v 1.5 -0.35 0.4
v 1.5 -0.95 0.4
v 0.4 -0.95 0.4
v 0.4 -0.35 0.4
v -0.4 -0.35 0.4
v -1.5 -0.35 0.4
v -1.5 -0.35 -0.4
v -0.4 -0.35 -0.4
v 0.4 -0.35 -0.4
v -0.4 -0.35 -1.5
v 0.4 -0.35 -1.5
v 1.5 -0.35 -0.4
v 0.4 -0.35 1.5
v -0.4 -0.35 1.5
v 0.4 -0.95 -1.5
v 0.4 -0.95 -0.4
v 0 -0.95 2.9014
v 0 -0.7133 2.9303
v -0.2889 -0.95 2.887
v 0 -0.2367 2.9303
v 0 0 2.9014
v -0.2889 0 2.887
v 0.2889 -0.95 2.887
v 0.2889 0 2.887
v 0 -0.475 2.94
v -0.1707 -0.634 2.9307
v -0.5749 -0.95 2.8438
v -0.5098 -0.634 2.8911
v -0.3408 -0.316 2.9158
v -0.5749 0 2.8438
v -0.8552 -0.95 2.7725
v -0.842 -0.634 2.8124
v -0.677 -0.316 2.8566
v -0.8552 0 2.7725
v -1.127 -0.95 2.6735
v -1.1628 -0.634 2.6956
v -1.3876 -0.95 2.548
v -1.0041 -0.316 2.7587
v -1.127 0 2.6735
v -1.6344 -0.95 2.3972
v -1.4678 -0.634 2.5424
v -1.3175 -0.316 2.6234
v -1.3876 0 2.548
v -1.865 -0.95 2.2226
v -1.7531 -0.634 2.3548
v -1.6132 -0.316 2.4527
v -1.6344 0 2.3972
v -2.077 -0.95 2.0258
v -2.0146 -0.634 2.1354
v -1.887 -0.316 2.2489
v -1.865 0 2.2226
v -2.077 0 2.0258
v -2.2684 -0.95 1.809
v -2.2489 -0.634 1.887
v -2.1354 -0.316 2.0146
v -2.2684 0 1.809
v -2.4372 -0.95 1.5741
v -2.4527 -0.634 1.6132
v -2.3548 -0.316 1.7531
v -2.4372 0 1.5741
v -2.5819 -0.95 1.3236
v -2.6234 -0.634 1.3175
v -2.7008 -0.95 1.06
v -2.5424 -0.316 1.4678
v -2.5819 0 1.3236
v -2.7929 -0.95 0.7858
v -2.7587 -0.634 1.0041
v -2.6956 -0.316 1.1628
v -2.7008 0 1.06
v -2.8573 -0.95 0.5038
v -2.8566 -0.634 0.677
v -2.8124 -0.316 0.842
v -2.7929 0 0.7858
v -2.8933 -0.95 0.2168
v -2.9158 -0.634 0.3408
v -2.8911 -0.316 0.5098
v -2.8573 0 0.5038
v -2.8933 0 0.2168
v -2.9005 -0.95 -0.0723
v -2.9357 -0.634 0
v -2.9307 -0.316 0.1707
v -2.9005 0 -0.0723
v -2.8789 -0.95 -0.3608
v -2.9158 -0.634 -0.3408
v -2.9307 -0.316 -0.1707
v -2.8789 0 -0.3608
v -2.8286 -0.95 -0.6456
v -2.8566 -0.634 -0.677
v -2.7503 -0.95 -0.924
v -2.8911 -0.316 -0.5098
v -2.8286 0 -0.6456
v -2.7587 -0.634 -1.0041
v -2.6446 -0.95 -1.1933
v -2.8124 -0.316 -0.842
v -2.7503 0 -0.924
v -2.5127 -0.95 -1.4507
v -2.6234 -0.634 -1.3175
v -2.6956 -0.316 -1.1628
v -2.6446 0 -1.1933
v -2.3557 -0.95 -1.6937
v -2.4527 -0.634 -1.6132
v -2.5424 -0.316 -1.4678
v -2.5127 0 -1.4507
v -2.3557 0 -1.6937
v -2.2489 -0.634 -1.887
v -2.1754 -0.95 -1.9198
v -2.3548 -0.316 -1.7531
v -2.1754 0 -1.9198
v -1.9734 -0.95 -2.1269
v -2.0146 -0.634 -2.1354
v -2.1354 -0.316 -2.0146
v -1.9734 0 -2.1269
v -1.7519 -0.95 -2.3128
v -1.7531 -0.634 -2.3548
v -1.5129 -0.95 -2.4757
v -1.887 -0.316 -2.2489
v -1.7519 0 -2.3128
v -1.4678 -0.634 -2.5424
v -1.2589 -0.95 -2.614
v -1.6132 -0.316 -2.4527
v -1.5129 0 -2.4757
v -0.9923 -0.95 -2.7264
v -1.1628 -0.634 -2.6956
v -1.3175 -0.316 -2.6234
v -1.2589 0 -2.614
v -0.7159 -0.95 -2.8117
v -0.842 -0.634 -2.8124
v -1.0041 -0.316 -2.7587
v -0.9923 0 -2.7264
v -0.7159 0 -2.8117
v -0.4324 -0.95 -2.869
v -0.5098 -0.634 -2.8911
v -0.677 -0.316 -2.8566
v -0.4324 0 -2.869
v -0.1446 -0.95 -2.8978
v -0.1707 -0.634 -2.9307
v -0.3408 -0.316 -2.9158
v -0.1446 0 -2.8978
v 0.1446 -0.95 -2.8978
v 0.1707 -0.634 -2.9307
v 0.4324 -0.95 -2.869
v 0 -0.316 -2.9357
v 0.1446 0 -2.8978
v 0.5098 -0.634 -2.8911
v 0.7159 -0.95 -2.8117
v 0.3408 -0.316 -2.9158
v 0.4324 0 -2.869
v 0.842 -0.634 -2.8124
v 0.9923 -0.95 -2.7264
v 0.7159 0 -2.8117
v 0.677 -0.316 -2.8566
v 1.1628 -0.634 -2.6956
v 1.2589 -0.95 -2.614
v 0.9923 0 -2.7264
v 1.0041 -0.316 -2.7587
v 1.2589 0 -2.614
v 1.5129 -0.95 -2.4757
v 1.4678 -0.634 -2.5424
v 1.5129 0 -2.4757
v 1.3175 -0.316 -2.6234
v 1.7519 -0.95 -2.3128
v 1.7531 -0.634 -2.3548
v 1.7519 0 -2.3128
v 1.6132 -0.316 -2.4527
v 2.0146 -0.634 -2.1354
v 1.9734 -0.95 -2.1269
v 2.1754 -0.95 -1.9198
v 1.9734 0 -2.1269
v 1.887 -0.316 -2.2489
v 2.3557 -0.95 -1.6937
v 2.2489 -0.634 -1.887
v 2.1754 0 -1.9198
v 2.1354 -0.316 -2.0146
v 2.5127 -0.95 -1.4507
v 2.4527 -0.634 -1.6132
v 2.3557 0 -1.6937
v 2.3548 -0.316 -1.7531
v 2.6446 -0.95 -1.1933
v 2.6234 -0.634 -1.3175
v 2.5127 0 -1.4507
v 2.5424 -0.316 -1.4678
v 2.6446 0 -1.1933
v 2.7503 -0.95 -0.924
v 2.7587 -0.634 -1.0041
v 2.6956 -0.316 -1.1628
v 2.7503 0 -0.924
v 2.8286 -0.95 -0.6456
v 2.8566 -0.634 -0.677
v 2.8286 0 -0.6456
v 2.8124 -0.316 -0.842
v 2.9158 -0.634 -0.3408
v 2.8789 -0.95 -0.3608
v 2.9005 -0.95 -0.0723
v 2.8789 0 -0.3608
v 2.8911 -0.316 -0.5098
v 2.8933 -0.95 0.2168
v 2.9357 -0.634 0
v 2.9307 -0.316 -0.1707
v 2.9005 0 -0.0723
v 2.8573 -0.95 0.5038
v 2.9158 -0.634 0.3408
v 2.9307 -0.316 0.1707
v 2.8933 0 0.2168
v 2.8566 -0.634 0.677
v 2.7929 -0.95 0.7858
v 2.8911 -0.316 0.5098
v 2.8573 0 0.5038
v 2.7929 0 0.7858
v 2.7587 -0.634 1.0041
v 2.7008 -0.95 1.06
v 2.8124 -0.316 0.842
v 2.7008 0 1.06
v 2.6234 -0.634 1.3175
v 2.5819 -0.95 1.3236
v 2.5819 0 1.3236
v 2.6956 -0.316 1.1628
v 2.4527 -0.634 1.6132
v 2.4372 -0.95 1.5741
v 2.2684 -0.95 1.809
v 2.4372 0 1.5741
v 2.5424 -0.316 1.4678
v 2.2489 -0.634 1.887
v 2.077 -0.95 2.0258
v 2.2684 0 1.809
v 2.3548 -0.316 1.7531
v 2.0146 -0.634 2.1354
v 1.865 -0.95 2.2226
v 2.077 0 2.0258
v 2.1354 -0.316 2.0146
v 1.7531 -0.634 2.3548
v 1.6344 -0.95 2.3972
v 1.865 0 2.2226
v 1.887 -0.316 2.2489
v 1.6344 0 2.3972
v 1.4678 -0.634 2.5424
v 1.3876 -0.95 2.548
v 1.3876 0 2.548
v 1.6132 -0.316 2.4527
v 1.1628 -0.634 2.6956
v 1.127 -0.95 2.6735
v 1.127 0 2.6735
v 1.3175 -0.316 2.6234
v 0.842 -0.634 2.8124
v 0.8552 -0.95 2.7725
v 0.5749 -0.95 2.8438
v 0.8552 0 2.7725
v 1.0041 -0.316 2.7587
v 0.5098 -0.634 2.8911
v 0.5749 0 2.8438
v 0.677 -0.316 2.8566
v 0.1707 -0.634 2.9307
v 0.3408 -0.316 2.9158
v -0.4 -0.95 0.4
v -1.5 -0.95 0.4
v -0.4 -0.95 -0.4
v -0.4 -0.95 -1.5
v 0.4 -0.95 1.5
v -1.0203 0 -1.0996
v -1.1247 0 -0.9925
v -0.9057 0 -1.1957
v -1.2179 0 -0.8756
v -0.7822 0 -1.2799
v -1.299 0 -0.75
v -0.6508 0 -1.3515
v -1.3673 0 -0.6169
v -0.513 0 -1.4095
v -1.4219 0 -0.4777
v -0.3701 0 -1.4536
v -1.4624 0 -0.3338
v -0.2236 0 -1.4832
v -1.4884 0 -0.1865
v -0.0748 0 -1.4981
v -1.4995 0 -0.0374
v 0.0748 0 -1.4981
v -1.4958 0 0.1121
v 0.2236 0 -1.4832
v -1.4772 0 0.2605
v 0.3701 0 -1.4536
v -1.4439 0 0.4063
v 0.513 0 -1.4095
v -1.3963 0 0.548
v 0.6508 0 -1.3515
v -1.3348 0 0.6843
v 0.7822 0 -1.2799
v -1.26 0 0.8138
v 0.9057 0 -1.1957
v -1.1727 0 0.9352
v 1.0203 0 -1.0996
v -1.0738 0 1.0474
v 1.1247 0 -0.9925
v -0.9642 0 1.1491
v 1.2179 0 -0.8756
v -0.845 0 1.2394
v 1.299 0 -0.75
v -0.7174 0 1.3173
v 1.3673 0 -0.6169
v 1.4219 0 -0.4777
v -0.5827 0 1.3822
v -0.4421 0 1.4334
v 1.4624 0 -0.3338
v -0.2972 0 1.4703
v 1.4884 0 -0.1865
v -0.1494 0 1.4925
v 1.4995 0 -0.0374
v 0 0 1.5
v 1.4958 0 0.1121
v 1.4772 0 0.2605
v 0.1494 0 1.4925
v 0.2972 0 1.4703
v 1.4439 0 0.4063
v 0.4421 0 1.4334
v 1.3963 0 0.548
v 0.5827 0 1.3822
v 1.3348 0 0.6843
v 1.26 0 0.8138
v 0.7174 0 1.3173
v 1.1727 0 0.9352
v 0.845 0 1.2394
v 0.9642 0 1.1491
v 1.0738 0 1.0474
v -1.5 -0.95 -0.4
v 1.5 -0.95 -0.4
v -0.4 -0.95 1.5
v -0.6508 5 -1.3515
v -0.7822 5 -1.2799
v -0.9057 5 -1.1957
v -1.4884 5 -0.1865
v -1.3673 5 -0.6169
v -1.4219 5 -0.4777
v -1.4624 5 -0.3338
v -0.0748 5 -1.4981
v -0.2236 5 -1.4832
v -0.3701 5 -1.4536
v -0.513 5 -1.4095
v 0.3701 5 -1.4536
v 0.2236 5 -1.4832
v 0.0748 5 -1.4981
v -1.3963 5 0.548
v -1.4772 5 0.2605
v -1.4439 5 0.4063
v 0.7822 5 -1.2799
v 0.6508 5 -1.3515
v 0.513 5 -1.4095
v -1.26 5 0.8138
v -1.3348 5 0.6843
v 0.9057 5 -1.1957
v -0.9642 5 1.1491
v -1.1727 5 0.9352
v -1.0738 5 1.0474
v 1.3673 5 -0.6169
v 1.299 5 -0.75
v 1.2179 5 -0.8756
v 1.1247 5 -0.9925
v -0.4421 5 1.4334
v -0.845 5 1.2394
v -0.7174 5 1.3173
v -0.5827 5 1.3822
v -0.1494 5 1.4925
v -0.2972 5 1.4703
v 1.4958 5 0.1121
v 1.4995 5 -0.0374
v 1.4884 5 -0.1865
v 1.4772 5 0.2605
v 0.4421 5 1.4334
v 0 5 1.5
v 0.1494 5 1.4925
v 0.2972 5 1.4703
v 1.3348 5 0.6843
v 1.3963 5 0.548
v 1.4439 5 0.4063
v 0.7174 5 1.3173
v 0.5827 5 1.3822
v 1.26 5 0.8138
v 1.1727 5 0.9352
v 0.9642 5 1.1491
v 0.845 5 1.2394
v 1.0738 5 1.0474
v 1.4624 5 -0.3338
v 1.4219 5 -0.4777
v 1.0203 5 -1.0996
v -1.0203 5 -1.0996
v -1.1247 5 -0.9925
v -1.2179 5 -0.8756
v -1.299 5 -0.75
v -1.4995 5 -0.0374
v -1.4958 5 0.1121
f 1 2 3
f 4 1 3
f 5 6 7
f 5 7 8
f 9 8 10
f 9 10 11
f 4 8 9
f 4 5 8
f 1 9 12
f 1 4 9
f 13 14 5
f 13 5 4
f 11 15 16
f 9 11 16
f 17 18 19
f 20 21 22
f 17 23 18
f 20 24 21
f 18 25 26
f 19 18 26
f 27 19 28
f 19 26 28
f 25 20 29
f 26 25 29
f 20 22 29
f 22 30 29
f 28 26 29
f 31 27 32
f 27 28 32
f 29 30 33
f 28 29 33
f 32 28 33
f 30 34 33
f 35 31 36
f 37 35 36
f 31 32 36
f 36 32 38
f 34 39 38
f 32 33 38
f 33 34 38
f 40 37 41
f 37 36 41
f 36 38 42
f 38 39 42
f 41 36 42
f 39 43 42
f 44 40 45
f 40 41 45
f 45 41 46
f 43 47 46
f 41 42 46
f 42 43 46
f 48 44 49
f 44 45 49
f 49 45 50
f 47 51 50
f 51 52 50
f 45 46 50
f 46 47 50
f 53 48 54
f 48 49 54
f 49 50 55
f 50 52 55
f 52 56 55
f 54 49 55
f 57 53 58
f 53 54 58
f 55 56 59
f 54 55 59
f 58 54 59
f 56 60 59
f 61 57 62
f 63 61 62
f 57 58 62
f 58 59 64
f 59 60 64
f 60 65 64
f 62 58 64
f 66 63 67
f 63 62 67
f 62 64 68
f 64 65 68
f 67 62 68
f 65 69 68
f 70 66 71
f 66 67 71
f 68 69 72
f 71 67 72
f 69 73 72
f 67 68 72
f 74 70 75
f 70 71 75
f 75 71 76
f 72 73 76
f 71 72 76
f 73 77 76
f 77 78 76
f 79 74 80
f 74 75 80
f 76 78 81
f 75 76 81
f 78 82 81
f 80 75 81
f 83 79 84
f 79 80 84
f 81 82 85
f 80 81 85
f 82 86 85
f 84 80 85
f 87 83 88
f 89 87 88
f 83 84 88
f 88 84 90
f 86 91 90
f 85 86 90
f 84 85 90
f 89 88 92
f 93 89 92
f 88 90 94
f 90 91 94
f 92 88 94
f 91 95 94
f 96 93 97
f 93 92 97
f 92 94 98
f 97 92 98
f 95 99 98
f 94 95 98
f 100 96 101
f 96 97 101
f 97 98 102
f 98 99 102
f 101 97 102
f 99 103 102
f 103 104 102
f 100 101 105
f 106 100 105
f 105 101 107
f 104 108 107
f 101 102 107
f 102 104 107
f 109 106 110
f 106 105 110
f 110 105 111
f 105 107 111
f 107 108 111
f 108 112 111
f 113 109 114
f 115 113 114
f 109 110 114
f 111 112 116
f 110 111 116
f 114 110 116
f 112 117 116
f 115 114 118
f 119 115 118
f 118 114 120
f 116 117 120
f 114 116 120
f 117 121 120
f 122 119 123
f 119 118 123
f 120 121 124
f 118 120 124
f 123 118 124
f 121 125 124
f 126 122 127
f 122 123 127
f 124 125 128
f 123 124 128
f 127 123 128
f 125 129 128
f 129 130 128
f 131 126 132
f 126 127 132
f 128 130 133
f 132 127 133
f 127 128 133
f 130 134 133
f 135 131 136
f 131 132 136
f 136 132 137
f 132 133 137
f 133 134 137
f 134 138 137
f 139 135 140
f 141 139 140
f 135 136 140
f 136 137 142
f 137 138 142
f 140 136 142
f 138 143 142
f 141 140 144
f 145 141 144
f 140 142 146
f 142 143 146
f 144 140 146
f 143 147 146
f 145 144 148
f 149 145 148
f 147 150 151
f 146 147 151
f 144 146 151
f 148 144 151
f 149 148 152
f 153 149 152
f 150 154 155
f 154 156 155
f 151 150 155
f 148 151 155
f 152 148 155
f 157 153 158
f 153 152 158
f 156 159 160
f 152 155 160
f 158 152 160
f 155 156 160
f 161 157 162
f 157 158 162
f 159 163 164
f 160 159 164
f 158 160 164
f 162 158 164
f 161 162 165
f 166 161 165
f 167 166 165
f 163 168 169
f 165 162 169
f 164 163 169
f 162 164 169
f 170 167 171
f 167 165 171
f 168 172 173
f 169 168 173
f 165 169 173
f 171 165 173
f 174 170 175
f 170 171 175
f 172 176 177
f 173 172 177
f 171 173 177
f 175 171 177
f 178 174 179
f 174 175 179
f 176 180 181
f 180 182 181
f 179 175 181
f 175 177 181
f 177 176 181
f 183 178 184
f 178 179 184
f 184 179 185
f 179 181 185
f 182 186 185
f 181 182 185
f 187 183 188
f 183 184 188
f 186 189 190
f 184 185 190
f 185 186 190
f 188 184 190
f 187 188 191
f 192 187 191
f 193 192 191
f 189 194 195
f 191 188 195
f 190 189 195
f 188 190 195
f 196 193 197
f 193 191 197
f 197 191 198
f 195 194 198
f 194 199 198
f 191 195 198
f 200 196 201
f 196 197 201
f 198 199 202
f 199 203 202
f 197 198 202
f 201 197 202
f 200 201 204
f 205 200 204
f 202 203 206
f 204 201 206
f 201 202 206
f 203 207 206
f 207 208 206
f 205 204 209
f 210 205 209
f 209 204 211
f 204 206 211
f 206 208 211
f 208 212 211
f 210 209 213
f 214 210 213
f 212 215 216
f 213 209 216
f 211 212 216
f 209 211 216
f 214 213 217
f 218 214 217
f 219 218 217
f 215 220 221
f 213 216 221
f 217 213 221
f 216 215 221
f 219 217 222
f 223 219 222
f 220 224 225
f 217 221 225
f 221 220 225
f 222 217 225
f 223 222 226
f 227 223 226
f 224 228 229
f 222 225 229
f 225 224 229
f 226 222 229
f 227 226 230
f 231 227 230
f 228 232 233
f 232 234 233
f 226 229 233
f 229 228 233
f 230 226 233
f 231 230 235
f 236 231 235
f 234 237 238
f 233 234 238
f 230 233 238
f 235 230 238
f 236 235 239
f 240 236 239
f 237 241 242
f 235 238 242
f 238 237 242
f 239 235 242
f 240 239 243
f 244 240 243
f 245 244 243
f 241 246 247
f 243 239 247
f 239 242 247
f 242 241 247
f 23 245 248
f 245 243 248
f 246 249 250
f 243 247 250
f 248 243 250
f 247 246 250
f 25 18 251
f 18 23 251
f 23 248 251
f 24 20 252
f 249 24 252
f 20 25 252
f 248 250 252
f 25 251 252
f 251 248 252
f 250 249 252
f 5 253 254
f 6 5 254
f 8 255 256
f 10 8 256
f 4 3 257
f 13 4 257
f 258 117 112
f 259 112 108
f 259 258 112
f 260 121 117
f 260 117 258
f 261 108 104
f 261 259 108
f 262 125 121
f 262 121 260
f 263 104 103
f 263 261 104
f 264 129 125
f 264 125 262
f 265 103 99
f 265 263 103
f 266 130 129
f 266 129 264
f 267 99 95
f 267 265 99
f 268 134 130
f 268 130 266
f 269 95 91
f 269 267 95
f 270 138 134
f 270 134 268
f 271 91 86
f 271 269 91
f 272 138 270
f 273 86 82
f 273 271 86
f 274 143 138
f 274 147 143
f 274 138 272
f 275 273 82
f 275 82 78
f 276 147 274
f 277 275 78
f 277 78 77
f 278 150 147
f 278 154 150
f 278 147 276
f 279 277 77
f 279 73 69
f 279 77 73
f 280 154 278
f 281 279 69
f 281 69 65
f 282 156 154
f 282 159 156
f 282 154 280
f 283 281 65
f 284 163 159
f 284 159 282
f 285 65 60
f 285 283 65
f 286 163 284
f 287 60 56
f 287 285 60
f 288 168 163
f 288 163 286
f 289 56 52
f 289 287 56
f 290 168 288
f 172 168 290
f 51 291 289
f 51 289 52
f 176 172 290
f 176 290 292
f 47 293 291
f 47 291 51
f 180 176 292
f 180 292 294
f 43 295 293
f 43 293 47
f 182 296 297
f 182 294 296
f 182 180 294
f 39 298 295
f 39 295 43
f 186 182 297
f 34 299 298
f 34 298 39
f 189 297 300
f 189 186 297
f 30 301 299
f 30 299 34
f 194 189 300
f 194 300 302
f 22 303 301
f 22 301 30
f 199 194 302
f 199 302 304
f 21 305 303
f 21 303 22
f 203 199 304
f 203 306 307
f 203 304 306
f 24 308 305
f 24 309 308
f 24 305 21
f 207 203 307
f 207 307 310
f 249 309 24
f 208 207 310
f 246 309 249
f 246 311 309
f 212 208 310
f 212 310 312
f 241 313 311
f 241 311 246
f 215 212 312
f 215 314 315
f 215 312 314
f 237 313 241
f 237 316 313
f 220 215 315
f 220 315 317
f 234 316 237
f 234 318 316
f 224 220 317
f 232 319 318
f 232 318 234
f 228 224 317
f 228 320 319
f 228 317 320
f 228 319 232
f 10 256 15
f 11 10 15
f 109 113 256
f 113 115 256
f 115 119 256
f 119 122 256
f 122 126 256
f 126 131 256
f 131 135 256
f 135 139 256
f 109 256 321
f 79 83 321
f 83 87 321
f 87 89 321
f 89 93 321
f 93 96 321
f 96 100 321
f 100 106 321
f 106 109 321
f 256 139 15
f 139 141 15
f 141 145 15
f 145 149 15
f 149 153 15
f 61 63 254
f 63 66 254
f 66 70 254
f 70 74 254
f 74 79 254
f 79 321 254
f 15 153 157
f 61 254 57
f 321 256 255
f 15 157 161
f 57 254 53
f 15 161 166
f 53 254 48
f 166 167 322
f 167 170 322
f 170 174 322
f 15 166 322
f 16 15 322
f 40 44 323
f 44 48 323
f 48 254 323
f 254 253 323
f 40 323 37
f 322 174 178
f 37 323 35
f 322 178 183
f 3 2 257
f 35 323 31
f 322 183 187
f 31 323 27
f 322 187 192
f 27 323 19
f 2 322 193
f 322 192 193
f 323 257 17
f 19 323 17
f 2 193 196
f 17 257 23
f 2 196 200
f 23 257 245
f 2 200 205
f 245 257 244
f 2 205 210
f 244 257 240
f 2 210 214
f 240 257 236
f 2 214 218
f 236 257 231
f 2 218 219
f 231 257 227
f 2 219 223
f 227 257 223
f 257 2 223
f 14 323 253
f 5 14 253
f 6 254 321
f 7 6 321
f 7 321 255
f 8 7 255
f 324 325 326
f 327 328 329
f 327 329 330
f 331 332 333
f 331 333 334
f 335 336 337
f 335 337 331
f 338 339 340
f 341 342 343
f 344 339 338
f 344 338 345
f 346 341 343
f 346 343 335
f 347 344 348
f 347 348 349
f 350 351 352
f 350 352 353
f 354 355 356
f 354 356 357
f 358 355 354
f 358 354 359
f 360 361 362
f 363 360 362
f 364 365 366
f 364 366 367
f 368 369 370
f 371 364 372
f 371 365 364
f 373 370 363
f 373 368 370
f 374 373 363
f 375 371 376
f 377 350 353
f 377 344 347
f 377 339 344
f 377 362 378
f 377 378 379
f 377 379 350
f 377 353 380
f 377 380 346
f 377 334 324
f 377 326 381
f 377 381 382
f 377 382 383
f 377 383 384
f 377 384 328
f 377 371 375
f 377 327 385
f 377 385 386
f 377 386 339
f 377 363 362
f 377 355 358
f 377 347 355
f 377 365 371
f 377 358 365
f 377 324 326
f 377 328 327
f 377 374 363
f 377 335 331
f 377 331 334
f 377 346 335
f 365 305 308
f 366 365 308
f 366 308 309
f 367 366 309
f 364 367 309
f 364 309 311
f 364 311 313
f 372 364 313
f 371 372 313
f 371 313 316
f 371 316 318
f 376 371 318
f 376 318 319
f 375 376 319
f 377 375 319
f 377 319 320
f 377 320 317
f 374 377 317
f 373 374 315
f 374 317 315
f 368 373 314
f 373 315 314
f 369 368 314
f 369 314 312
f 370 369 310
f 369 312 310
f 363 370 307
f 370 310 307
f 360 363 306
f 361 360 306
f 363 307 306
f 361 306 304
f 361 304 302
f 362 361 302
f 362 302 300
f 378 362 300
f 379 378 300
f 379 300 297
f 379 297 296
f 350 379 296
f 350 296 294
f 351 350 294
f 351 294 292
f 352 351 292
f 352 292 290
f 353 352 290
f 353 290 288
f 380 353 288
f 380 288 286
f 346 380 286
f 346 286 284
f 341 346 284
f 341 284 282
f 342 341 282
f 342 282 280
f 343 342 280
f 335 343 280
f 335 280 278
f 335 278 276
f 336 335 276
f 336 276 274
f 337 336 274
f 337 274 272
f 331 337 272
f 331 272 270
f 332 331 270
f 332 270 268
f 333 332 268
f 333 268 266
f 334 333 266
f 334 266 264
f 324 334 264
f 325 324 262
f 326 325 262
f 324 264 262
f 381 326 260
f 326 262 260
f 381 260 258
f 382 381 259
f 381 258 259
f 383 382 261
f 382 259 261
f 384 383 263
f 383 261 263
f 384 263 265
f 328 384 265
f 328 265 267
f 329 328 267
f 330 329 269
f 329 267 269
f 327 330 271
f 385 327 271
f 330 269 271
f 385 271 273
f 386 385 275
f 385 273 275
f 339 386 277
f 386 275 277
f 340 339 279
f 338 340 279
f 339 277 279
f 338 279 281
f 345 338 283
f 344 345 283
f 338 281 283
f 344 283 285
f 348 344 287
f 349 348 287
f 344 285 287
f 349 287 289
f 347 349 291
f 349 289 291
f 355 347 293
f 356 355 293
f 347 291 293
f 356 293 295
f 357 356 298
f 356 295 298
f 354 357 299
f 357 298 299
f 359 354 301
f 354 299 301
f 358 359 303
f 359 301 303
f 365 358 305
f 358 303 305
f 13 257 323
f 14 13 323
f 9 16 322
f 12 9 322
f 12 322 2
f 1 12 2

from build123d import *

# Parameters (mm, degrees)
SKETCH_1_R          = 1.5
EXTRUDE_1_DEPTH     = 2
SKETCH_2_R          = 2.95
EXTRUDE_2_DEPTH     = 0.95
CUT_EXTRUDE_1_DEPTH = 0.6
SKETCH_1_8_R        = 1.5
EXTRUDE_5_DEPTH     = 5


with BuildPart() as part:
    # 草图1 → 拉伸1 (new body)
    with BuildSketch(Plane(origin=(0, 0, 0), x_dir=(1, 0, 0), z_dir=(0, 1, 0))):
        Circle(SKETCH_1_R)
    extrude(amount=EXTRUDE_1_DEPTH)

    # 草图2 → Extrude 2 (add)
    with BuildSketch(Plane(origin=(0, 0, 0), x_dir=(-1, 0, 0), z_dir=(0, 1, 0))):
        Circle(SKETCH_2_R)
    extrude(amount=-EXTRUDE_2_DEPTH)

    # 草图4 → 切除-旋转1 (revolve, cut)
    with BuildSketch(Plane(origin=(0, 0, 0), x_dir=(0, 0, -1), z_dir=(1, 0, 0))):
        with BuildLine():
            Line((-2.901374674, 0), (-2.95, 0))
            Line((-2.95, 0), (-2.95, -0.95))
            Line((-2.95, -0.95), (-2.901374674, -0.95))
            ThreePointArc((-2.901374674, -0.95), (-2.94, -0.475), (-2.901374674, 0))
        make_face()
    revolve(axis=Axis((0, 3.165730861, 0), (0, -1, 0)), mode=Mode.SUBTRACT)

    # 草图3 → 切除-拉伸1 (cut)
    with BuildSketch(Plane.XZ.offset(0.95)):
        Polygon((1.5, -0.4), (1.5, 0.4), (0.4, 0.4), (0.4, 1.5), (-0.4, 1.5), (-0.4, 0.4), (-1.5, 0.4), (-1.5, -0.4), (-0.4, -0.4), (-0.4, -1.5), (0.4, -1.5), (0.4, -0.4), align=None)
    extrude(amount=-CUT_EXTRUDE_1_DEPTH, mode=Mode.SUBTRACT)

    # 草图1<8> → 凸台-拉伸5 (add)
    with BuildSketch(Plane(origin=(0, 0, 0), x_dir=(1, 0, 0), z_dir=(0, 1, 0))):
        Circle(SKETCH_1_8_R)
    extrude(amount=EXTRUDE_5_DEPTH)


solid = part.part
